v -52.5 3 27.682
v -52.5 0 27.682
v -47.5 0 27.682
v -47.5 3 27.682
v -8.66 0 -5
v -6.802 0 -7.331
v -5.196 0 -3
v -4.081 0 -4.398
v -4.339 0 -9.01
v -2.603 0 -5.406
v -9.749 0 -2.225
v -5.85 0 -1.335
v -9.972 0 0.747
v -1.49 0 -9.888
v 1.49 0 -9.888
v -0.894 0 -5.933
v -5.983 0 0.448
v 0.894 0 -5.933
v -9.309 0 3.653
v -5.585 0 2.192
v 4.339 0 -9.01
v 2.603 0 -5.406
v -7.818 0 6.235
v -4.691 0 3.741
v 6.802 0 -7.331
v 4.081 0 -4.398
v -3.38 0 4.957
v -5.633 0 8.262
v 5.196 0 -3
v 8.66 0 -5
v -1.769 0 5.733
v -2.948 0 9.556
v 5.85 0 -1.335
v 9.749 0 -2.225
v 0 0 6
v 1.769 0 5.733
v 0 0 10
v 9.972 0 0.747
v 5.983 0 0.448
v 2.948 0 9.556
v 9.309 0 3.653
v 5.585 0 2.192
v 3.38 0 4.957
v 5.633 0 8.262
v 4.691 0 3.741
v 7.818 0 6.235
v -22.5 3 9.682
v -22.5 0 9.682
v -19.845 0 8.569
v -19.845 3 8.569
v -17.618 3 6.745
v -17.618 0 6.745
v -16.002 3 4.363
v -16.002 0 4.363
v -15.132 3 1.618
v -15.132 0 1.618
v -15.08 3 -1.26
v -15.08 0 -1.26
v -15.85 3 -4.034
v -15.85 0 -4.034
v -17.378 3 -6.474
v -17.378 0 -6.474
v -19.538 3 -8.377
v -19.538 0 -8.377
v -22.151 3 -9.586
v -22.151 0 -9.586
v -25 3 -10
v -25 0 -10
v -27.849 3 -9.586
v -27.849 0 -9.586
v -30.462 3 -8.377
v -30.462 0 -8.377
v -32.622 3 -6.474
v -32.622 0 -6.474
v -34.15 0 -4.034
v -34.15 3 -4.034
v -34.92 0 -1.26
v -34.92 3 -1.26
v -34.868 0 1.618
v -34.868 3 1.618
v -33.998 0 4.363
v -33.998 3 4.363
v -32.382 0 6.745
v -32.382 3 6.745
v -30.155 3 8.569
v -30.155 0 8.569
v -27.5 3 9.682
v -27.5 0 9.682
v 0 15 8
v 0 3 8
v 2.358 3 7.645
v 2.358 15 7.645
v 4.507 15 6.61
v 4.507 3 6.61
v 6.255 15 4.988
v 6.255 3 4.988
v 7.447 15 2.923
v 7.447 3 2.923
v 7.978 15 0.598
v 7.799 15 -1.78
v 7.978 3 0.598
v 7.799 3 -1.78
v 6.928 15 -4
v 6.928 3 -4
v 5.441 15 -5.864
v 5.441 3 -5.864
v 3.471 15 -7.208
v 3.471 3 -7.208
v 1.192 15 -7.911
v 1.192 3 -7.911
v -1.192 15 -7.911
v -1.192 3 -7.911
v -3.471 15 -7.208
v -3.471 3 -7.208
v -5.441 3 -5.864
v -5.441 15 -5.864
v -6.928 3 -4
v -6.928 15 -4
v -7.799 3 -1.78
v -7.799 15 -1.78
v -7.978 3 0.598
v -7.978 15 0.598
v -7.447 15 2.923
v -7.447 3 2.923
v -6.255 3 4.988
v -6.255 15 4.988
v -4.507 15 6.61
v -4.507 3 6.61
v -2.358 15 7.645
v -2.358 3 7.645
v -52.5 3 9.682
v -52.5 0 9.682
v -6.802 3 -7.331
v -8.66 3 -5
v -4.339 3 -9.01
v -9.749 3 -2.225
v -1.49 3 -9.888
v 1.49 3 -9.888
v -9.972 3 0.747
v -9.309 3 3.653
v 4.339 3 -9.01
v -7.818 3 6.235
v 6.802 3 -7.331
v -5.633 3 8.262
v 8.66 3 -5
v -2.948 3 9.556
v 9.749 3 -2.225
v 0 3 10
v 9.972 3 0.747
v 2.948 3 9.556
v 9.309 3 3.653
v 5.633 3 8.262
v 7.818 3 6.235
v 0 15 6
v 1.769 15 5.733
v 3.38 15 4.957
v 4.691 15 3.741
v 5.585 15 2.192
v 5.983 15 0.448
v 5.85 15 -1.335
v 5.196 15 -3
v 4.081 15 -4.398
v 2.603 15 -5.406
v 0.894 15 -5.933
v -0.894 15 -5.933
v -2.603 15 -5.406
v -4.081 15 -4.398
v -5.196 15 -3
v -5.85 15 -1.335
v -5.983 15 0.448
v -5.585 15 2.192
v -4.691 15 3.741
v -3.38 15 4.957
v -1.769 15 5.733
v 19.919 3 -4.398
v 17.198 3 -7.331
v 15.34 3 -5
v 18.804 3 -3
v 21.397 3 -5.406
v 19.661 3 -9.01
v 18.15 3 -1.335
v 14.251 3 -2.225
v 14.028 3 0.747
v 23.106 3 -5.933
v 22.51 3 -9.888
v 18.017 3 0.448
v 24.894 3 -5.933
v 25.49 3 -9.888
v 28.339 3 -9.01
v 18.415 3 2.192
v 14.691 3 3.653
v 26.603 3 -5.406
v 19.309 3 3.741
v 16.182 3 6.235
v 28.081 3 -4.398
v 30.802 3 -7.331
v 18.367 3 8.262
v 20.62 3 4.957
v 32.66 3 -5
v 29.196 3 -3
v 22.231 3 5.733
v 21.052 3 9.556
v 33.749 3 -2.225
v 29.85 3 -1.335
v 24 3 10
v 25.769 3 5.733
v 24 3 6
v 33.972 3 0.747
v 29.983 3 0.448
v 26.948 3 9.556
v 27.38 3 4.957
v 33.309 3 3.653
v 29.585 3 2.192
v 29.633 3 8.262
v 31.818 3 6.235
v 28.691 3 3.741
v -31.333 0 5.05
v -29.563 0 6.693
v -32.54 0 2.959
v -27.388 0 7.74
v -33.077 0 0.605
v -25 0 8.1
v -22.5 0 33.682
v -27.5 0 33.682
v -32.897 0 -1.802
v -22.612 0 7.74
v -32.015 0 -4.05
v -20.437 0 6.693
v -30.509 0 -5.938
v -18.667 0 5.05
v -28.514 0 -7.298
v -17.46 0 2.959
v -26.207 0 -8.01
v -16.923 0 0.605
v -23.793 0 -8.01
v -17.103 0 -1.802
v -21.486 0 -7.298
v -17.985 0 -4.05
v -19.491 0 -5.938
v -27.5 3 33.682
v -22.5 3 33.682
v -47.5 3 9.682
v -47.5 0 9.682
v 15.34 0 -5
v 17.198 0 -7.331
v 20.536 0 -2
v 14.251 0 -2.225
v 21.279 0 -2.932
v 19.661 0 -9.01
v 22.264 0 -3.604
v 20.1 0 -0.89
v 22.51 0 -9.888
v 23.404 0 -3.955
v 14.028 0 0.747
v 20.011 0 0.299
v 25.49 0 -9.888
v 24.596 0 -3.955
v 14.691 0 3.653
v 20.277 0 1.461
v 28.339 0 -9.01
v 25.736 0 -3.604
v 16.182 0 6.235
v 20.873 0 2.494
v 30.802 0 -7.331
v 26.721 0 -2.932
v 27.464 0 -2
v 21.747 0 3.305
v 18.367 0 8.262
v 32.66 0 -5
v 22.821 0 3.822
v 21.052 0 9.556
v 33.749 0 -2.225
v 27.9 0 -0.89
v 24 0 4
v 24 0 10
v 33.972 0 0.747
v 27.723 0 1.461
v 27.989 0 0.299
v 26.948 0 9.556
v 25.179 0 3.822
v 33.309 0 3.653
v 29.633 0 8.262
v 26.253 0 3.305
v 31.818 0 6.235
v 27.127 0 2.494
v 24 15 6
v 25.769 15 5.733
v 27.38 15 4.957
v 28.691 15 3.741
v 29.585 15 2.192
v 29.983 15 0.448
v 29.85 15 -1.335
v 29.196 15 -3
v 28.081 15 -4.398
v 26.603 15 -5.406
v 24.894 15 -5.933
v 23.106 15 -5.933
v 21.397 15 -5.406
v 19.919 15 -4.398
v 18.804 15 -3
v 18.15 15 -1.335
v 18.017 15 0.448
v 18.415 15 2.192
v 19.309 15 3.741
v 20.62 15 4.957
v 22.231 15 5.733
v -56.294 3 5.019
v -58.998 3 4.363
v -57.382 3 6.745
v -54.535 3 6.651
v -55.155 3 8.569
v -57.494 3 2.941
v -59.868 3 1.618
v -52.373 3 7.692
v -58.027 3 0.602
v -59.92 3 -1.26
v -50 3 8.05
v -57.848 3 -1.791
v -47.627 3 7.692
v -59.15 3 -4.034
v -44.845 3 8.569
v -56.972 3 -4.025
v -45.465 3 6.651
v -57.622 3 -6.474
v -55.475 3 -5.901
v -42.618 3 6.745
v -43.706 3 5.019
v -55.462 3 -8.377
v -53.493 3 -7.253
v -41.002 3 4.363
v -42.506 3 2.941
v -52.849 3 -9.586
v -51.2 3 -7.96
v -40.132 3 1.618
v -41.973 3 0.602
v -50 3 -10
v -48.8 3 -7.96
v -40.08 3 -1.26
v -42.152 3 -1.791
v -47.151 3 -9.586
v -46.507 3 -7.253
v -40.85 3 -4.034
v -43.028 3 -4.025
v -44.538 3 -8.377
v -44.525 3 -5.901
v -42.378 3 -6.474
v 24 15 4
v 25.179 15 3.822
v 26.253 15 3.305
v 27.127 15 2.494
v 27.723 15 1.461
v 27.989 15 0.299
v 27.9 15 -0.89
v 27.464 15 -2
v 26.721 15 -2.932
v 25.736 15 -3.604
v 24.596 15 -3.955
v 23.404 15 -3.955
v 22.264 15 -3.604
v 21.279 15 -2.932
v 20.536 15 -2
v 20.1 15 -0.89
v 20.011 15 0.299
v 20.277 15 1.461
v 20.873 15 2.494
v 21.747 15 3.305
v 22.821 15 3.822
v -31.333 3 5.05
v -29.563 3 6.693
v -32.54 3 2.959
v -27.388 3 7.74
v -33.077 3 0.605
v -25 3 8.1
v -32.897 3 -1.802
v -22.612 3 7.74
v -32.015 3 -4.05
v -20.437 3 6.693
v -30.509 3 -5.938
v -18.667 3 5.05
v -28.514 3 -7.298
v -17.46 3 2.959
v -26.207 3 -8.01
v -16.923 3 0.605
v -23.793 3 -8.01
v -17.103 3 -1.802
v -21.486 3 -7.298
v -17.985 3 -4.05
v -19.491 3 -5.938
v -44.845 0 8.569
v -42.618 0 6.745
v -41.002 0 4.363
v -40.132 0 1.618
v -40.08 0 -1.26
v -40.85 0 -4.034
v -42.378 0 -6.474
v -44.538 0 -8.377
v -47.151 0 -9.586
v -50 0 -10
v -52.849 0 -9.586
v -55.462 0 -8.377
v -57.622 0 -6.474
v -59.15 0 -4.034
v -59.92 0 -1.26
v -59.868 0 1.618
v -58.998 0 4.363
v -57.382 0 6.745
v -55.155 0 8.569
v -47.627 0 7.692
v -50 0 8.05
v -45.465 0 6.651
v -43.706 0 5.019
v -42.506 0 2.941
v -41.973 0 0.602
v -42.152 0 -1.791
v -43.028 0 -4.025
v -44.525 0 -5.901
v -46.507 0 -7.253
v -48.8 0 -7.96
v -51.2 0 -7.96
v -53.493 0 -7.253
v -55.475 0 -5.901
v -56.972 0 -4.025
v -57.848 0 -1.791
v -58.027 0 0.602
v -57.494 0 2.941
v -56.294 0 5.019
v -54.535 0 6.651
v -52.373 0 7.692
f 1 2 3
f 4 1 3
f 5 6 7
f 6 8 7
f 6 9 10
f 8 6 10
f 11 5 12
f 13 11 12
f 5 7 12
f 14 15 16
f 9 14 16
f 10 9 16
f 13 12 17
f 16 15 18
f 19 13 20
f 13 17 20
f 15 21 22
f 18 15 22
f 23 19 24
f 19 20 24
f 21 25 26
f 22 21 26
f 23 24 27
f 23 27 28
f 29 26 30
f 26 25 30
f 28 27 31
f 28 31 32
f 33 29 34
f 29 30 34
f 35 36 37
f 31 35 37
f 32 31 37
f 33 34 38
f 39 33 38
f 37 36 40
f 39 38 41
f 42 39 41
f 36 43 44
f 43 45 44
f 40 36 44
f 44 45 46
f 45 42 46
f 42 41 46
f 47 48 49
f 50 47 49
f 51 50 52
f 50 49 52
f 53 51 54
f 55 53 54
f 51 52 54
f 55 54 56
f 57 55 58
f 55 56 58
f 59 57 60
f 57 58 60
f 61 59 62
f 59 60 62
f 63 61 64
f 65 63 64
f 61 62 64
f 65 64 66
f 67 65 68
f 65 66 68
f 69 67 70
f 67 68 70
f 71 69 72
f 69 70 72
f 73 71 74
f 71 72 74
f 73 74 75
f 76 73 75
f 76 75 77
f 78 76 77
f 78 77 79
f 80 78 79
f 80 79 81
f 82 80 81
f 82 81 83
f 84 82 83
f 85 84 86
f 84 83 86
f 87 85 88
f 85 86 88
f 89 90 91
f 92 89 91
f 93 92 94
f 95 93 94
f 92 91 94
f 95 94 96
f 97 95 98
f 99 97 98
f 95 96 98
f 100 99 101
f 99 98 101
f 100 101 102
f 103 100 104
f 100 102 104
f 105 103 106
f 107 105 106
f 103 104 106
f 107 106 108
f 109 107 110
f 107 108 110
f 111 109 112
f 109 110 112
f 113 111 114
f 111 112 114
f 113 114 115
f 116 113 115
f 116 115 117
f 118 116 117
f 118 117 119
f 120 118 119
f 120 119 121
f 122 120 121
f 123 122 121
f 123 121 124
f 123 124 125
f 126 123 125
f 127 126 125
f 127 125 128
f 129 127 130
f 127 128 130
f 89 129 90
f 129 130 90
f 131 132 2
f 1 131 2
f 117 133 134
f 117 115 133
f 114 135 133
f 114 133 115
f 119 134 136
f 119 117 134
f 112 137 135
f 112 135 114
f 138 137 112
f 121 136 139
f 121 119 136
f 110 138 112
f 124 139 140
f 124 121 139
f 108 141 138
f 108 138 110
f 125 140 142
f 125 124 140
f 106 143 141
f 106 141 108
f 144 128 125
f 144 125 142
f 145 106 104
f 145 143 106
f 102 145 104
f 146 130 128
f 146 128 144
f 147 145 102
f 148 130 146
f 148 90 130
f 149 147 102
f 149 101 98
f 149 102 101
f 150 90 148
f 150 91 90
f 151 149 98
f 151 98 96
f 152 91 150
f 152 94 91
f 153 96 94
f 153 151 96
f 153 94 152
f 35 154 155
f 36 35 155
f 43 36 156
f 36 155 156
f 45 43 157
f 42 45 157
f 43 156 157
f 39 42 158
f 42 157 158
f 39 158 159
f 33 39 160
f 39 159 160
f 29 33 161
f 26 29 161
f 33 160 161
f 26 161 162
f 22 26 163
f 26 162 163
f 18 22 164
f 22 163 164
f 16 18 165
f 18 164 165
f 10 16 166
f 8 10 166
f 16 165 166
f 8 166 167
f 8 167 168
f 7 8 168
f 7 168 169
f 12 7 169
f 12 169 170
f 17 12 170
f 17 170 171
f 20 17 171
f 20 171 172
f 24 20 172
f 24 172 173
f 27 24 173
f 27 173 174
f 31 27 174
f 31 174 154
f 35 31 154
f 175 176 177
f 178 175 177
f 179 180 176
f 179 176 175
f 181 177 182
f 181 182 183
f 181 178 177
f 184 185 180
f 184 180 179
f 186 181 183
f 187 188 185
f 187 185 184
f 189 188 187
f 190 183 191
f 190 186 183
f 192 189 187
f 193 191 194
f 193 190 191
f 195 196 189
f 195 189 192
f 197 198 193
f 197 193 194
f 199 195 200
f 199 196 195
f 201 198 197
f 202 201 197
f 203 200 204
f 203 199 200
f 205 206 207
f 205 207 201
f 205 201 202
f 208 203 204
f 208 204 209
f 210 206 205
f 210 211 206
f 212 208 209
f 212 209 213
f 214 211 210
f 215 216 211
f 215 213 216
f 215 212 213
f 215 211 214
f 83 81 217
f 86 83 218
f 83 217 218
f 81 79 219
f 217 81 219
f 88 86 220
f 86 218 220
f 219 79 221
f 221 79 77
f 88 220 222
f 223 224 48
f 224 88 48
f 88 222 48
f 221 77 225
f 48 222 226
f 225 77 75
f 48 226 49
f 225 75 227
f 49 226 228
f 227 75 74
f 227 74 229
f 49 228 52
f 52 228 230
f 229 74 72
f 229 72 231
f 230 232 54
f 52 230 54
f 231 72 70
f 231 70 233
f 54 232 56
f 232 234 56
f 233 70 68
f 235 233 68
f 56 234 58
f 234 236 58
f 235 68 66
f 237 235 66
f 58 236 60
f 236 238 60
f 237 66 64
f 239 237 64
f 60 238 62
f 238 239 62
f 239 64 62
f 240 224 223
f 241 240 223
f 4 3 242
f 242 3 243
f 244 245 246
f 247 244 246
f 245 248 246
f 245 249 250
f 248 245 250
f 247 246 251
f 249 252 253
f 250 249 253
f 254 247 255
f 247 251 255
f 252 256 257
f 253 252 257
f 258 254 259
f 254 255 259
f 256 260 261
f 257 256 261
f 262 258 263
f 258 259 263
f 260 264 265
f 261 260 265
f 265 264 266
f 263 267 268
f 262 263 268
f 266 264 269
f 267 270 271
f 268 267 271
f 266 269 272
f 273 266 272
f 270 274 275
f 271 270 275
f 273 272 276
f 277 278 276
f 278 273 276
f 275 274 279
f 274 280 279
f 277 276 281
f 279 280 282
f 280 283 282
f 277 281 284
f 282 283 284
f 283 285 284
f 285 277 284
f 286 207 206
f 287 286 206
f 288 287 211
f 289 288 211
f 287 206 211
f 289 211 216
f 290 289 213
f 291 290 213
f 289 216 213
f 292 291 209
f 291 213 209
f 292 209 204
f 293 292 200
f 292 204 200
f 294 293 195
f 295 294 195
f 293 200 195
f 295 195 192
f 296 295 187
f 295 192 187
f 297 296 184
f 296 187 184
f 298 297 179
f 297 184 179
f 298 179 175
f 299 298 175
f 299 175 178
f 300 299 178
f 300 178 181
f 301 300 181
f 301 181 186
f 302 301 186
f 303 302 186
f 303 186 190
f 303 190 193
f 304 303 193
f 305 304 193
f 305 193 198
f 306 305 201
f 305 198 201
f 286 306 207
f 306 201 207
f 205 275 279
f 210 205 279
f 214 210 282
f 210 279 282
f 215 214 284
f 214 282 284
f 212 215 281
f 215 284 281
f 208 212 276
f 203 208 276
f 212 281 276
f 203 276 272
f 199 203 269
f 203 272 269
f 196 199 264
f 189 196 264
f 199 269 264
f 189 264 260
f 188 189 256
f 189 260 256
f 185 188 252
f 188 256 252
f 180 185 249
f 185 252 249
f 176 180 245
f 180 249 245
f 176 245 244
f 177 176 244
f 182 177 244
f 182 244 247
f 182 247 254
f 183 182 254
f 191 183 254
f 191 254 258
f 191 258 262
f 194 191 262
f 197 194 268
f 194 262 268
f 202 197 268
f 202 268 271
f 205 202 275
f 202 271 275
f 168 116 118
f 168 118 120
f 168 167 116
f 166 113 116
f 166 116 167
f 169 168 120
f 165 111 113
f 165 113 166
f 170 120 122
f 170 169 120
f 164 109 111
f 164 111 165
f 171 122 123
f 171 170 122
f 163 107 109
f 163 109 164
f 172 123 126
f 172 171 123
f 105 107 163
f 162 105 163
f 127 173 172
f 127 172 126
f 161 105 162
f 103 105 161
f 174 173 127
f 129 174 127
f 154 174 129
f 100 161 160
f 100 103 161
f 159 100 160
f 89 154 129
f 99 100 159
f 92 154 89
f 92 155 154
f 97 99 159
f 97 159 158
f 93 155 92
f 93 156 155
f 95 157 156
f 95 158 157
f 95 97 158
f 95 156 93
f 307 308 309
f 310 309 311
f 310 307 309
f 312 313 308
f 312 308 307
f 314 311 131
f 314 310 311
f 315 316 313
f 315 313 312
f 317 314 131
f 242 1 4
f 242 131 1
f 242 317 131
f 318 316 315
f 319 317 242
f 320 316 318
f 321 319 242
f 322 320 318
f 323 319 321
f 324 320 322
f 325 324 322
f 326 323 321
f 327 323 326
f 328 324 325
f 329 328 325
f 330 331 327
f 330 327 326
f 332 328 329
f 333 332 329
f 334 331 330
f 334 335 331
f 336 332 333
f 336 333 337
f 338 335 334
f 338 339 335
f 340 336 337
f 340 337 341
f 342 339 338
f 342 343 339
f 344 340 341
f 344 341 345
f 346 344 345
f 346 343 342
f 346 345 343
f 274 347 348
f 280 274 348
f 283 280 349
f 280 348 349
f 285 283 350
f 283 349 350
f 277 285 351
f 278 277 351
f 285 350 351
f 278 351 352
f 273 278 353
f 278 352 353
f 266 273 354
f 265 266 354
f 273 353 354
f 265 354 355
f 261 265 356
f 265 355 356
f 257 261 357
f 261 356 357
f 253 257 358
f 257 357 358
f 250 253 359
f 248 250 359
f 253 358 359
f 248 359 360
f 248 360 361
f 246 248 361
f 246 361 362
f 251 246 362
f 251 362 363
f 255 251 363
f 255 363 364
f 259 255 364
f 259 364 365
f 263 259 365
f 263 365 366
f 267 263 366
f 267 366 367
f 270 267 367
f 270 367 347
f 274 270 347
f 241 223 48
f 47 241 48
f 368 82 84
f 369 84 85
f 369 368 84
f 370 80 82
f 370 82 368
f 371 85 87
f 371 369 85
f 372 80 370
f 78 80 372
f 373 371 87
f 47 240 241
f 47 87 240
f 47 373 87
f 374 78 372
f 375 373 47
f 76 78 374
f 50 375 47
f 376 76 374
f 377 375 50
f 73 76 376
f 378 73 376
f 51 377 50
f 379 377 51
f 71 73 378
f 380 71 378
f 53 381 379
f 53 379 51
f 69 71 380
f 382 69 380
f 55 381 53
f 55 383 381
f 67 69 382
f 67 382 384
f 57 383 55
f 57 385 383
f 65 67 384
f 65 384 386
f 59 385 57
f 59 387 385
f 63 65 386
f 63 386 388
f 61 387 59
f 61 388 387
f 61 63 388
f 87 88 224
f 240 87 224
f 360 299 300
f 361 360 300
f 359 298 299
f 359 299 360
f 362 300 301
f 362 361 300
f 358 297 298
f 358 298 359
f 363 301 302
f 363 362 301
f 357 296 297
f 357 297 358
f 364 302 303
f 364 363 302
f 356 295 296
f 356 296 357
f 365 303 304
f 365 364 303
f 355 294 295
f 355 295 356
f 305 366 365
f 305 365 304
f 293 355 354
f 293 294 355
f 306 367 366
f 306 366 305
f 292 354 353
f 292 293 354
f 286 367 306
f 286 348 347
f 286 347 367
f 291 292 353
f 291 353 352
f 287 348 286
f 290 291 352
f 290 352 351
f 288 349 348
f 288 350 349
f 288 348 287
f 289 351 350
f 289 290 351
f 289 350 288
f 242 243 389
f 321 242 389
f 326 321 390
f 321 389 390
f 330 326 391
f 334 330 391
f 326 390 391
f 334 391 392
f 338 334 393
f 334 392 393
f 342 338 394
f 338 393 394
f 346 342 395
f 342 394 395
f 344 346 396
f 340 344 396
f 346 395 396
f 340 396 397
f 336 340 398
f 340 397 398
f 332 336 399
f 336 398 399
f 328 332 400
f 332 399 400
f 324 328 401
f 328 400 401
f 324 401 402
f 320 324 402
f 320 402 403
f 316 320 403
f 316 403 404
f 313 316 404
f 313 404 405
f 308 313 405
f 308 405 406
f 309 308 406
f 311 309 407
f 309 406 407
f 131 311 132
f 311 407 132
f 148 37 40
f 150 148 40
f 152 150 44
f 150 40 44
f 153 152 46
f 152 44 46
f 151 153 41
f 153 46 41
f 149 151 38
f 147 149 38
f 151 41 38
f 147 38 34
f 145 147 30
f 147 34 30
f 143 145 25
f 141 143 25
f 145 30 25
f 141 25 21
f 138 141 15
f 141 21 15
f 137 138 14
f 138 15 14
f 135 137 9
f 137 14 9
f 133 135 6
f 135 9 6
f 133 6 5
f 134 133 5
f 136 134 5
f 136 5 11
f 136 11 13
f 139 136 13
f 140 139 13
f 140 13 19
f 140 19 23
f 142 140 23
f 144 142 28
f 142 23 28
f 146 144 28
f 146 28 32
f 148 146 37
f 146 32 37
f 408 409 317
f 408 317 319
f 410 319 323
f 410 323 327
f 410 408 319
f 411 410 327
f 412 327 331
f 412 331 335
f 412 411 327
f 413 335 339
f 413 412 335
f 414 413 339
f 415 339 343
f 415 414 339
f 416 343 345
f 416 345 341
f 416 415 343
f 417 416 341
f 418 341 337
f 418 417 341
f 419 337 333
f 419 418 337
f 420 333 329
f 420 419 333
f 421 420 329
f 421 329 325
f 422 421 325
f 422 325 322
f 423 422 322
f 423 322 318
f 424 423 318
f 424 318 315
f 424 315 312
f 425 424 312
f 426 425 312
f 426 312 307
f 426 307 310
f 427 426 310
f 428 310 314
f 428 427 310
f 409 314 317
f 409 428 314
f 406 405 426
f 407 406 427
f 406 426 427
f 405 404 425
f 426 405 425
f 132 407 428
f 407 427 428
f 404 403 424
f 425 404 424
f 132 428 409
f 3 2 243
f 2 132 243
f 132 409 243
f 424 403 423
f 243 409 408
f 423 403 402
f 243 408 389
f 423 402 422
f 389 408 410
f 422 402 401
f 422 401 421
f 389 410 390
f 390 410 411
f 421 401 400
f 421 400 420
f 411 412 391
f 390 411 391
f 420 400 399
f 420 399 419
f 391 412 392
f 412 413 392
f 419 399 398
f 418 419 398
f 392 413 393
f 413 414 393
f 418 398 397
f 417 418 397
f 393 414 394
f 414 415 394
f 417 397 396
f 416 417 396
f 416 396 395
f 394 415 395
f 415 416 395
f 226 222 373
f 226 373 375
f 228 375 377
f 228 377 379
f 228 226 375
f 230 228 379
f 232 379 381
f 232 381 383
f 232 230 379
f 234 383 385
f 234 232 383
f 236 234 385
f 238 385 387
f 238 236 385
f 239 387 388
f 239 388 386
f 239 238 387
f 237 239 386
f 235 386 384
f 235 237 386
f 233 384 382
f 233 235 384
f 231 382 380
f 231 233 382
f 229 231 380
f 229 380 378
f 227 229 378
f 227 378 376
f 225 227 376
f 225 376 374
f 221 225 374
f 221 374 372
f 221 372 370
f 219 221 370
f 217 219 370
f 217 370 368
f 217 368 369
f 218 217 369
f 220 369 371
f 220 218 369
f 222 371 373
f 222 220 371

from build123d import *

# Parameters (mm, degrees)
SKETCH_1_R          = 10
EXTRUDE_1_DEPTH     = 3
EXTRUDE_1_2_DEPTH   = 3
SKETCH_4_R          = 6
EXTRUDE_2_DEPTH     = 12
SKETCH_3_R          = 8
EXTRUDE_3_DEPTH     = 12
SKETCH_5_R          = 8.05
EXTRUDE_4_DEPTH     = 3
SKETCH_5_R_2        = 8.1
EXTRUDE_4_2_DEPTH   = 3
SKETCH_10_R         = 6
CUT_EXTRUDE_1_DEPTH = 71.423774406
SKETCH_11_R         = 4
CUT_EXTRUDE_2_DEPTH = 71.423774406


with BuildPart() as part:
    # Эскиз1 → Бобышка-Вытянуть1 (new body)
    with BuildSketch(Plane(origin=(0, 0, 0), x_dir=(1, 0, 0), z_dir=(0, 1, 0))):
        with Locations(Location((0, 0, 0), (0, 0, 270))):
            Circle(SKETCH_1_R)
    extrude(amount=EXTRUDE_1_DEPTH)

    # Эскиз3 → Бобышка-Вытянуть3 (add)
    with BuildSketch(Plane(origin=(0, 3, 0), x_dir=(1, 0, 0), z_dir=(0, 1, 0))):
        with Locations(Location((0, 0, 0), (0, 0, 270))):
            Circle(SKETCH_3_R)
    extrude(amount=EXTRUDE_3_DEPTH)

    # Эскиз10 → Вырез-Вытянуть1 (cut, through all)
    with BuildSketch(Plane(origin=(0, 15, 0), x_dir=(1, 0, 0), z_dir=(0, 1, 0))):
        with Locations(Location((0, 0, 0), (0, 0, 270))):
            Circle(SKETCH_10_R)
    extrude(amount=-CUT_EXTRUDE_1_DEPTH, mode=Mode.SUBTRACT)


with BuildPart() as body_2:
    # Эскиз1 → Extrude 1 2 (new body)
    with BuildSketch(Plane(origin=(0, 0, 0), x_dir=(1, 0, 0), z_dir=(0, 1, 0))):
        with Locations(Location((24, 0, 0), (0, 0, 270))):
            Circle(SKETCH_1_R)
    extrude(amount=EXTRUDE_1_2_DEPTH)

    # Эскиз4 → Бобышка-Вытянуть2 (add)
    with BuildSketch(Plane(origin=(0, 3, 0), x_dir=(1, 0, 0), z_dir=(0, 1, 0))):
        with Locations(Location((24, 0, 0), (0, 0, 270))):
            Circle(SKETCH_4_R)
    extrude(amount=EXTRUDE_2_DEPTH)

    # Эскиз11 → Вырез-Вытянуть2 (cut, through all)
    with BuildSketch(Plane(origin=(0, 15, 0), x_dir=(1, 0, 0), z_dir=(0, 1, 0))):
        with Locations(Location((24, 0, 0), (0, 0, 270))):
            Circle(SKETCH_11_R)
    extrude(amount=-CUT_EXTRUDE_2_DEPTH, mode=Mode.SUBTRACT)


with BuildPart() as body_3:
    # Эскиз5 → Бобышка-Вытянуть4 (new body)
    with BuildSketch(Plane(origin=(0, 0, 0), x_dir=(1, 0, 0), z_dir=(0, 1, 0))):
        with BuildLine():
            Line((-52.5, -27.682458366), (-47.5, -27.682458366))
            Line((-47.5, -27.682458366), (-47.5, -9.682458366))
            ThreePointArc((-47.5, -9.682458366), (-50, 10), (-52.5, -9.682458366))
            Line((-52.5, -9.682458366), (-52.5, -27.682458366))
        make_face()
        with Locations(Location((-50, 0, 0), (0, 0, 270))):
            Circle(SKETCH_5_R, mode=Mode.SUBTRACT)
    extrude(amount=EXTRUDE_4_DEPTH)


with BuildPart() as body_4:
    # Эскиз5 → Extrude 4 2 (new body)
    with BuildSketch(Plane(origin=(0, 0, 0), x_dir=(1, 0, 0), z_dir=(0, 1, 0))):
        with BuildLine():
            Line((-27.5, -33.682458366), (-22.5, -33.682458366))
            Line((-22.5, -33.682458366), (-22.5, -9.682458366))
            ThreePointArc((-22.5, -9.682458366), (-25, 10), (-27.5, -9.682458366))
            Line((-27.5, -9.682458366), (-27.5, -33.682458366))
        make_face()
        with Locations(Location((-25, 0, 0), (0, 0, 270))):
            Circle(SKETCH_5_R_2, mode=Mode.SUBTRACT)
    extrude(amount=EXTRUDE_4_2_DEPTH)


solid = Compound([part.part, body_2.part, body_3.part, body_4.part])
